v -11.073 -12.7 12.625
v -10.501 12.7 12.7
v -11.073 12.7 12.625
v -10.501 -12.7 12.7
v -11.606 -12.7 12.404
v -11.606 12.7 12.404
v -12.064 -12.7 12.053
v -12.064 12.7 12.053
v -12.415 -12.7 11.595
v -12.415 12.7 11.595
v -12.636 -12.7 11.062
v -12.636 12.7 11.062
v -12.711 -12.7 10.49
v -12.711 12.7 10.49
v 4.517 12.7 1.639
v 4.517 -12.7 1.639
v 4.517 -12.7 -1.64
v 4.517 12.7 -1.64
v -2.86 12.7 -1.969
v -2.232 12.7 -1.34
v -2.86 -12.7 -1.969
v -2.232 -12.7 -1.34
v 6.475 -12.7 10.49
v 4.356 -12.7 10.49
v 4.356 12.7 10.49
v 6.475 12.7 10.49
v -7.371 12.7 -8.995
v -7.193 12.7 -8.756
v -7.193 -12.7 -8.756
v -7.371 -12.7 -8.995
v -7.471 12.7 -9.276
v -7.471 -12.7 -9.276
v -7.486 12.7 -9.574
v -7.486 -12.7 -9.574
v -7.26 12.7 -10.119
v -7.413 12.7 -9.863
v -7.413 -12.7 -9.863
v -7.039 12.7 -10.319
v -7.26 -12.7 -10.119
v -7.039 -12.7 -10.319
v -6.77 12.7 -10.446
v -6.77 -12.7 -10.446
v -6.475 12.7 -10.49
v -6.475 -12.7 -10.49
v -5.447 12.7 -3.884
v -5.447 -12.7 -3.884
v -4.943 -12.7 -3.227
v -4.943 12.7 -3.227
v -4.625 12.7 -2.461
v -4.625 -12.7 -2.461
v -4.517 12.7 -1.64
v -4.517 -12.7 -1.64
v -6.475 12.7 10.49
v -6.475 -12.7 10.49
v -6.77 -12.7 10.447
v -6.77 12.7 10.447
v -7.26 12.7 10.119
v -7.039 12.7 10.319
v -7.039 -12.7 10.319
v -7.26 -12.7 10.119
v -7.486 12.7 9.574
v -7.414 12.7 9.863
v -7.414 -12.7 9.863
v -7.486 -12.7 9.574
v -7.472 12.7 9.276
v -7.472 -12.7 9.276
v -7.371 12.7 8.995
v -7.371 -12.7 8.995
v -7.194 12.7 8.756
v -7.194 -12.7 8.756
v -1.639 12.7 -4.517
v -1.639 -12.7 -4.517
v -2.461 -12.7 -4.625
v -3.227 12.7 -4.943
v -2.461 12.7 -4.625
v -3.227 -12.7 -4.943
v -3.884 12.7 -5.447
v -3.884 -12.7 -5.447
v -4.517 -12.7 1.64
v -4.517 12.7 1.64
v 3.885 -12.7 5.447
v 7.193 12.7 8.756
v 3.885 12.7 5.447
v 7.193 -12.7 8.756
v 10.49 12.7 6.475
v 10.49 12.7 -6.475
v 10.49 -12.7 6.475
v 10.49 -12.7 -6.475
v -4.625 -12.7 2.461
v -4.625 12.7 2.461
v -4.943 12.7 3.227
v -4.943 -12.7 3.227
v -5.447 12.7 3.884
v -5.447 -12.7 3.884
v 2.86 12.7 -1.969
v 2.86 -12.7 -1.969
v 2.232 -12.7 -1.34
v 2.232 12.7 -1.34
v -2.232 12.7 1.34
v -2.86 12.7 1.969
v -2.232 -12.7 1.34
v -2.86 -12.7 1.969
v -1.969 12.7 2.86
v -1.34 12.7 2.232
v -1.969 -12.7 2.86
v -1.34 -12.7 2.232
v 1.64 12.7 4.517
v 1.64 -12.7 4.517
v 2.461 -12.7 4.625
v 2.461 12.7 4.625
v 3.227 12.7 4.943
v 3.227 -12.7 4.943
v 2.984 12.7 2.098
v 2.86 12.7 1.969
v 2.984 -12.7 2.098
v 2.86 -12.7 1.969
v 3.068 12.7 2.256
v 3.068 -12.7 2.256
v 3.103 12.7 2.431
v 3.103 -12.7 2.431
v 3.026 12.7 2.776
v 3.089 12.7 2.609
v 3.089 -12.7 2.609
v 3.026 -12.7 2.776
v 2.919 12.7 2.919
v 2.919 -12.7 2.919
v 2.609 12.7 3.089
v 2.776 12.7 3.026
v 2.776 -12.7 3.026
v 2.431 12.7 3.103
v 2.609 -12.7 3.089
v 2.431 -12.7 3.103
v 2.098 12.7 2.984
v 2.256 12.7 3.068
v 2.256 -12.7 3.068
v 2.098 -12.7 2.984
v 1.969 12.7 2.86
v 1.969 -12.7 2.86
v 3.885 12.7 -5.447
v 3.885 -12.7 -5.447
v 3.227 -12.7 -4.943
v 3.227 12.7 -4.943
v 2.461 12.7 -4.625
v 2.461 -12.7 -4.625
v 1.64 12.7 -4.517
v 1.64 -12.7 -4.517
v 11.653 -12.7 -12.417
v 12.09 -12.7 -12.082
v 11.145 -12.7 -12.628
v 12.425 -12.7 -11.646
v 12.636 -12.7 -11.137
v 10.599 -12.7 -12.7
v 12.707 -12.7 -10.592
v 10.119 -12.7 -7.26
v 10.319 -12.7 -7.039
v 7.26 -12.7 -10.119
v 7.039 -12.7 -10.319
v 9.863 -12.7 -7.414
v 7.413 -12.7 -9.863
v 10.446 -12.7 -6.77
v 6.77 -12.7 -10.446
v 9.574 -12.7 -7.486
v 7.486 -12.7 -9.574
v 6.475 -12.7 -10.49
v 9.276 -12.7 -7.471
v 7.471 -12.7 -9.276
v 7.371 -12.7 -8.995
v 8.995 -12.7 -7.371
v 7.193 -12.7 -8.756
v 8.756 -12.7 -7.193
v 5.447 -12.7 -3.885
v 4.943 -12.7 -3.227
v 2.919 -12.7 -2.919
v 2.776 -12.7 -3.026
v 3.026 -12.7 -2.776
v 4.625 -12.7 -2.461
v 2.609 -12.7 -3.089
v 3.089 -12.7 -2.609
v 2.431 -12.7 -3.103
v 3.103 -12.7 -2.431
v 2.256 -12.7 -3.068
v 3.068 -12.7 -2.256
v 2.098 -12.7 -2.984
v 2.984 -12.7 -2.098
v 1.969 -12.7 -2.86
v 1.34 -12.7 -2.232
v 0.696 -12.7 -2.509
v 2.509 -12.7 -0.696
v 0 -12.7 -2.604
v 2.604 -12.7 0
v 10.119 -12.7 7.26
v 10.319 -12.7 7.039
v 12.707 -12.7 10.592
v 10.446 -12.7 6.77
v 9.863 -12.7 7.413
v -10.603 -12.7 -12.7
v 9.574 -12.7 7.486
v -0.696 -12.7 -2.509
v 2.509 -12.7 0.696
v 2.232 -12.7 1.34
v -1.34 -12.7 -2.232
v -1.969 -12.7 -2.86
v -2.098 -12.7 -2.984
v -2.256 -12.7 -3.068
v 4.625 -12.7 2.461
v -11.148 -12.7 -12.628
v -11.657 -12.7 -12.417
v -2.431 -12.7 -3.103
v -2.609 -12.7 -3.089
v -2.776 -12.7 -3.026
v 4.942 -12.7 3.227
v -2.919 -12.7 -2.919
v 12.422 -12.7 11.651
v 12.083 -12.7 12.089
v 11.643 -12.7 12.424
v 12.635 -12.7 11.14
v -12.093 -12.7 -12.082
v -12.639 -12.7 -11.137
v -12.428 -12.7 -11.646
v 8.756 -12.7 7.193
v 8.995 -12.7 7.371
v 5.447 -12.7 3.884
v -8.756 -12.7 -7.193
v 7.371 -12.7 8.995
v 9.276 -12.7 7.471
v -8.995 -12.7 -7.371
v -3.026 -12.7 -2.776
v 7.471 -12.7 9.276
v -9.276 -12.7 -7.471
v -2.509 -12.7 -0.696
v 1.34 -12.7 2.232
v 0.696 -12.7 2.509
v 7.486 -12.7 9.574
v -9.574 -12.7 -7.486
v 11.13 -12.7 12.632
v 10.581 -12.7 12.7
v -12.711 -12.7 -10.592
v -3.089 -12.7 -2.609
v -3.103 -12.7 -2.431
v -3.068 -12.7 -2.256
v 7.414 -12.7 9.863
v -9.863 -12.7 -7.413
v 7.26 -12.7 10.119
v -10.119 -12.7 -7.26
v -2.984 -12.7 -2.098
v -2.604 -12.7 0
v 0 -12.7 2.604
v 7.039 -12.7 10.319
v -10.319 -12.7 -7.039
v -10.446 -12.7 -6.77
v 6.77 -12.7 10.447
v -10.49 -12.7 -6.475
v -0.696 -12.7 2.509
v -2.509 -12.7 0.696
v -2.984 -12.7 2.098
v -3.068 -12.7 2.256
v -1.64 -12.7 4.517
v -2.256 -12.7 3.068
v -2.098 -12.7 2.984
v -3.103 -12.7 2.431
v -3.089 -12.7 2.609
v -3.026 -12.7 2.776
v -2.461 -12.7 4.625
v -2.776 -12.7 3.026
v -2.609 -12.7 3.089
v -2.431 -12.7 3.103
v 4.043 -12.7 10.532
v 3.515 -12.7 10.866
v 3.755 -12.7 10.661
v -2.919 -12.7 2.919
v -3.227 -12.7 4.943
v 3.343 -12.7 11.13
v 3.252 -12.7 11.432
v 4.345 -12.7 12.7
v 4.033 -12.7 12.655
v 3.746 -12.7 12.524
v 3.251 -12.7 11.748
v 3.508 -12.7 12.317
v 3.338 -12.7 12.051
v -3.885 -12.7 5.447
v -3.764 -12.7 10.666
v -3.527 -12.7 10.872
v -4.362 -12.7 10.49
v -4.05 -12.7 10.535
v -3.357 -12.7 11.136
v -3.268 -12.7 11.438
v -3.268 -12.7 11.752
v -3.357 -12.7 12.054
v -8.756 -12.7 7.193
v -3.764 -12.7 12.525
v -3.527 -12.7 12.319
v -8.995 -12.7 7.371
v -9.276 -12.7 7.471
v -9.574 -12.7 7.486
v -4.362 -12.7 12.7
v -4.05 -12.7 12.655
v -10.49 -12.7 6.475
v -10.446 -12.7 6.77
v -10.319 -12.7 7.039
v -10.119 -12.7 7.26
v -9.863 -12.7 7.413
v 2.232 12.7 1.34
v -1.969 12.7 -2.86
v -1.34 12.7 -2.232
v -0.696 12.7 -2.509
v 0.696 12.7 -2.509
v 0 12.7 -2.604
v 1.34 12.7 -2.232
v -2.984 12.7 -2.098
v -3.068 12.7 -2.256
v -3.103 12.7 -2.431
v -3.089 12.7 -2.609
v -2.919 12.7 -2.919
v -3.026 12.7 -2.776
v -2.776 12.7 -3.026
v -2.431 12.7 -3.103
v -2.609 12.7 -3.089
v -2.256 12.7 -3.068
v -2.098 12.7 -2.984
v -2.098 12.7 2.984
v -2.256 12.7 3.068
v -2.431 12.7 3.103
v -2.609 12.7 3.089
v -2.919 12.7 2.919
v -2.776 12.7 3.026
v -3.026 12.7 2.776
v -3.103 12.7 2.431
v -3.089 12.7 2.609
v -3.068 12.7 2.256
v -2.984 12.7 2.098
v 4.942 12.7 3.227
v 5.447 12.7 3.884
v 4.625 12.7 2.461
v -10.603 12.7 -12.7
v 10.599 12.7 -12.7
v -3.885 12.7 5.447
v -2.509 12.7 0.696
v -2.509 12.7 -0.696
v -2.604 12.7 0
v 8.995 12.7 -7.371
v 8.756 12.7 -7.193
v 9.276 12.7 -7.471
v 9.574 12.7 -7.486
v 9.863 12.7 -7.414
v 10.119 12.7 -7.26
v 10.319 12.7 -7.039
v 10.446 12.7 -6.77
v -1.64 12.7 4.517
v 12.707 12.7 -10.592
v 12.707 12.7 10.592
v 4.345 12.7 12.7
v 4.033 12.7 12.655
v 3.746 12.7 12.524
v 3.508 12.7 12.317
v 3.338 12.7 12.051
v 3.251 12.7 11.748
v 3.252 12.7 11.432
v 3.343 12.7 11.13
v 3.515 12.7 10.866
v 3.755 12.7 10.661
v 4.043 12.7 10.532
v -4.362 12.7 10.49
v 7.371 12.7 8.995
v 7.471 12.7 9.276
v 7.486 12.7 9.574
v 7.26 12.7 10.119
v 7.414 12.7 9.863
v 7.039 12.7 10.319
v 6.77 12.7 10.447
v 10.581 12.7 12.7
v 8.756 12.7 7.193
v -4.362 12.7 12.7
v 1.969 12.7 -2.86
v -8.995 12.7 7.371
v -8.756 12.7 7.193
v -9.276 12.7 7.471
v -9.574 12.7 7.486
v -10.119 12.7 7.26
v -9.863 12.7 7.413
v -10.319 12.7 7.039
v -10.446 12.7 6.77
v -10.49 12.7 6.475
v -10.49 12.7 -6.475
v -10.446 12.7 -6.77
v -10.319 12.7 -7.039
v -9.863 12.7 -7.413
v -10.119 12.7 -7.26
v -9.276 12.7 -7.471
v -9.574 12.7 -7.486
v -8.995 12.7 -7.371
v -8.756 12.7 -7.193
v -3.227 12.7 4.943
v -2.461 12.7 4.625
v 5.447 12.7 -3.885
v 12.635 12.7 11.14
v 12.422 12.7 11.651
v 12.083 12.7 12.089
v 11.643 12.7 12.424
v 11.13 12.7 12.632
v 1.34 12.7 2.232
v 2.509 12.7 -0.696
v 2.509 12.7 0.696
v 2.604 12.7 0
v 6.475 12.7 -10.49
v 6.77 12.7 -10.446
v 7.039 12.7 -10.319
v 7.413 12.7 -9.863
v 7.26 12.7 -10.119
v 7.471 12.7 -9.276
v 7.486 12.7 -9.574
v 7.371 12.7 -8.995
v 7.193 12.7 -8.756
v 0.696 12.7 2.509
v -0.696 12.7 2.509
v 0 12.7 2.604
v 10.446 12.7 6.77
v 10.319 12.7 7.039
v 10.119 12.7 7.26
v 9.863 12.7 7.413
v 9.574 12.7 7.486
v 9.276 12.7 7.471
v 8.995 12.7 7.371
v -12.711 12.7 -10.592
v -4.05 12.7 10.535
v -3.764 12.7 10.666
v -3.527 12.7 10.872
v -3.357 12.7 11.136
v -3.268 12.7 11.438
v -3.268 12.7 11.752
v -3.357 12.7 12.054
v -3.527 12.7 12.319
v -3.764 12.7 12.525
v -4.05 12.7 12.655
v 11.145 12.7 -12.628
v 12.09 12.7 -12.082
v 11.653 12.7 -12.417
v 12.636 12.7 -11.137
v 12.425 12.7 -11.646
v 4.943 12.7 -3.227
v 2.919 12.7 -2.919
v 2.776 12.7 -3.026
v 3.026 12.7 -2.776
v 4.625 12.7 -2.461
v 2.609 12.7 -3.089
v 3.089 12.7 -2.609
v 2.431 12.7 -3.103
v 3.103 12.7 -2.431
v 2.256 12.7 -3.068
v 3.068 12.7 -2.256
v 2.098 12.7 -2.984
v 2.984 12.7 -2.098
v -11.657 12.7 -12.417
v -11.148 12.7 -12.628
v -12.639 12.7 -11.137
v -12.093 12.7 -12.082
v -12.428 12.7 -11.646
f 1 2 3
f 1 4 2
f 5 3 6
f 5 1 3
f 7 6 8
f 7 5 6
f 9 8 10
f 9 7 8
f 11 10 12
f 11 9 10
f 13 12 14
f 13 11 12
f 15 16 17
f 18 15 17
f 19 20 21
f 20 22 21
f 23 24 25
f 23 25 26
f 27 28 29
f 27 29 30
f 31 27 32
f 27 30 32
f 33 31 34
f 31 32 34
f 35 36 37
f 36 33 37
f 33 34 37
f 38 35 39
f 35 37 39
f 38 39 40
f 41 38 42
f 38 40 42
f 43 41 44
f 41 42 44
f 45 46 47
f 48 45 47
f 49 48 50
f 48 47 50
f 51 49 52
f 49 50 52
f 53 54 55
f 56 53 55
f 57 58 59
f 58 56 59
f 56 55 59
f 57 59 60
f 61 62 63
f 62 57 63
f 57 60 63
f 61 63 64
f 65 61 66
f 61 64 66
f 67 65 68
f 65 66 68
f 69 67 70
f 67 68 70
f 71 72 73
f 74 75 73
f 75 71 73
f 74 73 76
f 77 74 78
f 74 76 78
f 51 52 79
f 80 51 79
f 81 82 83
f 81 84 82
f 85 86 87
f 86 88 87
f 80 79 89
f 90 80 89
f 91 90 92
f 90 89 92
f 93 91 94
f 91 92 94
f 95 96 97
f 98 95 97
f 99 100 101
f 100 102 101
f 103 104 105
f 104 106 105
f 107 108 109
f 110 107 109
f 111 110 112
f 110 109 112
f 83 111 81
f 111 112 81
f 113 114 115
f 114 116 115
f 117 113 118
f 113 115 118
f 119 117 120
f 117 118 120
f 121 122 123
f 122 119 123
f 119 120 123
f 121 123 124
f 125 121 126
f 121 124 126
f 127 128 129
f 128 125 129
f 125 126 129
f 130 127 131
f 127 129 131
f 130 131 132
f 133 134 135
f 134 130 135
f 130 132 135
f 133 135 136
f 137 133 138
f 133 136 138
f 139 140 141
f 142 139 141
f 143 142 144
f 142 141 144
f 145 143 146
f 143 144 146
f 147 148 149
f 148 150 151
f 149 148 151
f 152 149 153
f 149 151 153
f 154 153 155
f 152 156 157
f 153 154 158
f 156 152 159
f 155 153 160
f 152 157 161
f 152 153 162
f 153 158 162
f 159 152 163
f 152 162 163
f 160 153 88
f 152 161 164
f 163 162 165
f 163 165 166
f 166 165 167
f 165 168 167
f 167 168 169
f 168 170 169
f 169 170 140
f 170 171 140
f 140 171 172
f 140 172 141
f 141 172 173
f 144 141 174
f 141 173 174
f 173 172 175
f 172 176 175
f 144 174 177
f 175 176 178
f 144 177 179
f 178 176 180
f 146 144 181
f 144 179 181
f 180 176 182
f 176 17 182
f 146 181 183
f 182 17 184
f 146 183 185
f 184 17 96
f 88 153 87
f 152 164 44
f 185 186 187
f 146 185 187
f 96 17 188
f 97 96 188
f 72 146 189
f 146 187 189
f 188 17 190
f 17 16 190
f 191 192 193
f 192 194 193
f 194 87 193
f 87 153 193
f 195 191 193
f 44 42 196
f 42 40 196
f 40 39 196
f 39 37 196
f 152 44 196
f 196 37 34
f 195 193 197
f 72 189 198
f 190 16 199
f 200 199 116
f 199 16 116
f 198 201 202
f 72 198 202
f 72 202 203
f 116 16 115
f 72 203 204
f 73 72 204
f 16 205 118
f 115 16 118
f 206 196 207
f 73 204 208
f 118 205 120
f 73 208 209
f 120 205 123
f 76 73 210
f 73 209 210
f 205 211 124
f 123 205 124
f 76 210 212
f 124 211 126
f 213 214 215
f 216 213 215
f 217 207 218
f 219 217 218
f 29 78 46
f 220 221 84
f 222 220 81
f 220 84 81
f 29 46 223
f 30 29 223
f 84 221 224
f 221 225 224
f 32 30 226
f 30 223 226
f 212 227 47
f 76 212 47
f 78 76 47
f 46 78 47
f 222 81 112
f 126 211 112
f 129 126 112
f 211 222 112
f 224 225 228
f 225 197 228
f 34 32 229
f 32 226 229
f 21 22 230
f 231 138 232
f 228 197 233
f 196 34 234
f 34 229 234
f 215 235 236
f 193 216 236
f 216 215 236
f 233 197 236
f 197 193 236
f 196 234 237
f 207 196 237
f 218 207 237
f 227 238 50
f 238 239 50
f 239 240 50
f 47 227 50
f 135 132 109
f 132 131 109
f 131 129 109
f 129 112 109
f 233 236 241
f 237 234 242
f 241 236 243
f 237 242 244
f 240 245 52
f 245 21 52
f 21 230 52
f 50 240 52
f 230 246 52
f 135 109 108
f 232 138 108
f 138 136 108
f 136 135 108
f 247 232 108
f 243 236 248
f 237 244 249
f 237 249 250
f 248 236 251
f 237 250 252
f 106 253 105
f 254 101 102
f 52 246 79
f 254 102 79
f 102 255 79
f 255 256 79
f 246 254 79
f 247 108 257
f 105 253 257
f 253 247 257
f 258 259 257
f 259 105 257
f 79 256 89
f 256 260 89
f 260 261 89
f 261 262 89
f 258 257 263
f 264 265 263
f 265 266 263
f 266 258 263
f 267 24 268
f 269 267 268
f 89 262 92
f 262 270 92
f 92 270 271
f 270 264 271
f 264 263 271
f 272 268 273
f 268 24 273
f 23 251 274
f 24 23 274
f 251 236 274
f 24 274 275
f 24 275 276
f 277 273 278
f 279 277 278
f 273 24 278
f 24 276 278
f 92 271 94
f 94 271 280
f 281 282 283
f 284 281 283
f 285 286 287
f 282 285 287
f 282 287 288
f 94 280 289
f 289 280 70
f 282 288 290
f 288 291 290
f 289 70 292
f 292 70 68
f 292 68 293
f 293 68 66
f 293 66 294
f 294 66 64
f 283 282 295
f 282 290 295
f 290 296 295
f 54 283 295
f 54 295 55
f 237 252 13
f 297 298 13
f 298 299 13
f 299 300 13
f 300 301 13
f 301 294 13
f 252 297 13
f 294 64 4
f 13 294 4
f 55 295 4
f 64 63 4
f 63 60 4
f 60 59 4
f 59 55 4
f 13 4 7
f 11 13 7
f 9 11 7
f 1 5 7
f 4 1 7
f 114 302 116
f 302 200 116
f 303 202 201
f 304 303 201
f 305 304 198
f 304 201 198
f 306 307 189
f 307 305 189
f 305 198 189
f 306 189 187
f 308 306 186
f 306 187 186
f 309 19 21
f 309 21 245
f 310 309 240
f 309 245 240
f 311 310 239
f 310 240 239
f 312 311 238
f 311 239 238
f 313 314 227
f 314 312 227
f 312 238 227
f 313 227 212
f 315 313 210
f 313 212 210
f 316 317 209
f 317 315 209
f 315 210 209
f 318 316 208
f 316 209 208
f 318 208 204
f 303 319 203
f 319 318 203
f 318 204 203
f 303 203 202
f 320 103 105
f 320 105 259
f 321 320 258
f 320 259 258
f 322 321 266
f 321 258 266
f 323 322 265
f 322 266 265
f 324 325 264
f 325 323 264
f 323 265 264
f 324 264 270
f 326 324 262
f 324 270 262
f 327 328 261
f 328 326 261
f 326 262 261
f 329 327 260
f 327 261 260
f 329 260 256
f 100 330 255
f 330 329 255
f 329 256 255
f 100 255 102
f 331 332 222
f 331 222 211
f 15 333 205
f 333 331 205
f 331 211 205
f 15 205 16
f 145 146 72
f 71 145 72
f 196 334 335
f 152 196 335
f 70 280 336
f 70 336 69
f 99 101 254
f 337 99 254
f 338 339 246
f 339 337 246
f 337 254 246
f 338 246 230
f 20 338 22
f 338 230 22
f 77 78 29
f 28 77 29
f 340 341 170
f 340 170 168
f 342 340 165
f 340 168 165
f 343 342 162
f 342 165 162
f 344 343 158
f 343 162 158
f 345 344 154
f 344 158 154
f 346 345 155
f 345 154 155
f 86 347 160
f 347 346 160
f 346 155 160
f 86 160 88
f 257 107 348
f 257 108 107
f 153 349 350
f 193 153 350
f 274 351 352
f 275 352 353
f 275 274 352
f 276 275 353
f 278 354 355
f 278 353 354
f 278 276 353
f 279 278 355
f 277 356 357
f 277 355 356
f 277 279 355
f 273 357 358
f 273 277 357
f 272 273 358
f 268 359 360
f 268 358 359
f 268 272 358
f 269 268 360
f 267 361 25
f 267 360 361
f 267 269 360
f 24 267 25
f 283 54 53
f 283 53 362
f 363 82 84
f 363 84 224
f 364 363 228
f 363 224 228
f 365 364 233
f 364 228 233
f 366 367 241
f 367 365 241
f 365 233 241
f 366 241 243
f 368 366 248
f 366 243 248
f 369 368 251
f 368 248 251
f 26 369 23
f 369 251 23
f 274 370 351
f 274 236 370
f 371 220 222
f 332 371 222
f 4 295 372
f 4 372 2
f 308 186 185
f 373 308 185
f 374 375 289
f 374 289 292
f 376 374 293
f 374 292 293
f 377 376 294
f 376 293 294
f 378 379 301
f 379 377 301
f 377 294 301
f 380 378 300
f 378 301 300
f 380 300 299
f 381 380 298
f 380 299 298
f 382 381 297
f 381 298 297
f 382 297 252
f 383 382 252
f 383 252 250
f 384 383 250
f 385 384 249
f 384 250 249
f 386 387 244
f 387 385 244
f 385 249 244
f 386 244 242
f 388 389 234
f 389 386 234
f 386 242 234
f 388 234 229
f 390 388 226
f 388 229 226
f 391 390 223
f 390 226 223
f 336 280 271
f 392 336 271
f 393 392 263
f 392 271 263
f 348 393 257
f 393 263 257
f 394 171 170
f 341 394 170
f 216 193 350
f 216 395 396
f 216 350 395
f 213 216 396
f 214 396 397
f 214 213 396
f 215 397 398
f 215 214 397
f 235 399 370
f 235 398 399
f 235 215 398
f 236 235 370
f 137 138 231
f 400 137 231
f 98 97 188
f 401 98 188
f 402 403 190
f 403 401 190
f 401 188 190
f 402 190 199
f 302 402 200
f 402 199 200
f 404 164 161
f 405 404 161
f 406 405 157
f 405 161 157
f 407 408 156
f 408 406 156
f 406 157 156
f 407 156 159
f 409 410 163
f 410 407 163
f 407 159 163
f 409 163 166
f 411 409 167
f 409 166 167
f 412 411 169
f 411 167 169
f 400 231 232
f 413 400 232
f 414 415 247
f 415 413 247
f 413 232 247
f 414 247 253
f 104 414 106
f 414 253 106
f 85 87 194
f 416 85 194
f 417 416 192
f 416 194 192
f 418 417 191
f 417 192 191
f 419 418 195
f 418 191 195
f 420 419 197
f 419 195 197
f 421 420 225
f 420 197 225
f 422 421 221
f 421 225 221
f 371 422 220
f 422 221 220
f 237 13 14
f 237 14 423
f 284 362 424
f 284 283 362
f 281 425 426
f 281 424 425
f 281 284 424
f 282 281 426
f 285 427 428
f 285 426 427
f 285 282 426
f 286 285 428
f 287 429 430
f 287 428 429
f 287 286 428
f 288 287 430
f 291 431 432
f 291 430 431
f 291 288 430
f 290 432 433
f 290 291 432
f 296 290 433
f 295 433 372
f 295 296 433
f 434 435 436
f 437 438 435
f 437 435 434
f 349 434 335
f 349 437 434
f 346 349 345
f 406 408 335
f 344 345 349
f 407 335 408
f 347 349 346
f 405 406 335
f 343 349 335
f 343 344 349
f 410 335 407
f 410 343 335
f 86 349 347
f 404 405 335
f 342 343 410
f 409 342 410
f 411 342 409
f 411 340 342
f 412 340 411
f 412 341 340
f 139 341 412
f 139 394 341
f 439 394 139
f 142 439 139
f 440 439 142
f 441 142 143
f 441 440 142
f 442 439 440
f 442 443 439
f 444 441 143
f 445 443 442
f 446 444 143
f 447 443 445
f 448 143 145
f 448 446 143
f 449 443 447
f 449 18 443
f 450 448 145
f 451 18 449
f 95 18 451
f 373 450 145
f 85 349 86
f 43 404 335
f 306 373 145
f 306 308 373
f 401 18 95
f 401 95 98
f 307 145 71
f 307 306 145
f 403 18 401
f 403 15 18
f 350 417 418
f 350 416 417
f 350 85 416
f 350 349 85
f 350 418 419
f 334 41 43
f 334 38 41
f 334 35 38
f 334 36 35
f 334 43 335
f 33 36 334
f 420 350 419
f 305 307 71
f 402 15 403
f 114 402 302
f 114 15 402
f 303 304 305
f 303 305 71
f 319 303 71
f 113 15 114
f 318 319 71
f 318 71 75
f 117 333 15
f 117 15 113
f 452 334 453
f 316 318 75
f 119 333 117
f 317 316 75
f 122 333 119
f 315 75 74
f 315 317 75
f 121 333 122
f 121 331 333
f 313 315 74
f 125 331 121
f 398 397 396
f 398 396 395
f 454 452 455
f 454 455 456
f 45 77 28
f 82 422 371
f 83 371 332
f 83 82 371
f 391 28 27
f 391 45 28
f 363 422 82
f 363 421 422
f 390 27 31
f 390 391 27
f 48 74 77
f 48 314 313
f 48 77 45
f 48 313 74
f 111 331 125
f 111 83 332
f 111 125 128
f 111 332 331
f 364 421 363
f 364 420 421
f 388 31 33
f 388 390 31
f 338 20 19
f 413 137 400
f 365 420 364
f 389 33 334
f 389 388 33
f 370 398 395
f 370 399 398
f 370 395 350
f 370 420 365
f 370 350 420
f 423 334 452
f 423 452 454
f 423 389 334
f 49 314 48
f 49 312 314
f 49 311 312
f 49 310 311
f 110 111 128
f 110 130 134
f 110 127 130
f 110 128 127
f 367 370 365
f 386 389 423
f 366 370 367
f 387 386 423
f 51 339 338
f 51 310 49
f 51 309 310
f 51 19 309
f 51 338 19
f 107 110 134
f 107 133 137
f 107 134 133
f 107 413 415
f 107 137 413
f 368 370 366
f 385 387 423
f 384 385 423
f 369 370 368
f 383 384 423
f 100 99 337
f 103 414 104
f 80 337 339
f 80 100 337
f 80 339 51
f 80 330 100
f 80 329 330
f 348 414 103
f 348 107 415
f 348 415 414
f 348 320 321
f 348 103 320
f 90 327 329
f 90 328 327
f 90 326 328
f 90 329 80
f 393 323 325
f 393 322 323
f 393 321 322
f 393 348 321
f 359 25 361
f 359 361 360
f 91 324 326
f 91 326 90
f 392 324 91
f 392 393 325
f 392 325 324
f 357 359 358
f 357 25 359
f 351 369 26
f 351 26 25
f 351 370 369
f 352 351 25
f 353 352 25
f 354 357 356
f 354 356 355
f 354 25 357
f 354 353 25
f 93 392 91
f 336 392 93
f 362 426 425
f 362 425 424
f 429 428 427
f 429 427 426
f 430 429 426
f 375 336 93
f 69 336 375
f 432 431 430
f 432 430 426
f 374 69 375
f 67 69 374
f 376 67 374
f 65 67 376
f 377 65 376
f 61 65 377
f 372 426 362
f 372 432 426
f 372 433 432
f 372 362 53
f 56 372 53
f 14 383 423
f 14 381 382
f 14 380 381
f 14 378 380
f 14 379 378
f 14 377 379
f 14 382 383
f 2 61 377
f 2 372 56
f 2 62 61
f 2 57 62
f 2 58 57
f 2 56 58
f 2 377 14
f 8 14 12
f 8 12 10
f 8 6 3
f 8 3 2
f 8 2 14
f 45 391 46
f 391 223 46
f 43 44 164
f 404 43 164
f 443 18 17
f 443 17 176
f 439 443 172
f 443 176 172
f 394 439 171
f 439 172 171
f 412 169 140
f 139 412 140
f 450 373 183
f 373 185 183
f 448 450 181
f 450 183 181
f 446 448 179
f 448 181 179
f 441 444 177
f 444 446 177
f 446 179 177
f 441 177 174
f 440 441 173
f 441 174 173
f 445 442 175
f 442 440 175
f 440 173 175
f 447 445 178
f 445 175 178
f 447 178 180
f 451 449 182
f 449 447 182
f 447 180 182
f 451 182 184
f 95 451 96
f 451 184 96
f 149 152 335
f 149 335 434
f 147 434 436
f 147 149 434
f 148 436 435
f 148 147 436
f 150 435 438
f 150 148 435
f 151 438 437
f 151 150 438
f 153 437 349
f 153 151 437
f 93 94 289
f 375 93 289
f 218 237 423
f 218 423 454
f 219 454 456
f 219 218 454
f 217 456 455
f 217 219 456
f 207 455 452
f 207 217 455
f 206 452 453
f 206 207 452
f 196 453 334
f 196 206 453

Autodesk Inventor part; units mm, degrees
ref_plane "YZ Plane" through (0, 0, 0) normal (1, 0, 0) x (0, 1, 0)
ref_plane "XZ Plane" through (0, 0, 0) normal (0, 1, 0) x (-1, 0, 0)
ref_plane "XY Plane" through (0, 0, 0) normal (0, 0, 1) x (1, 0, 0)
sketch "Sketch1" plane through (0, 0, 0) normal (0, 1, 0) x (-1, 0, 0)
  arc A0 (4.5172, -1.6395) -> (5.4471, -3.8845) centre (7.6922, -1.6395) ccw
  line L0 (8.7558, -7.1932) -> (5.4471, -3.8845)
  arc A1 (8.7558, -7.1932) -> (10.4902, -6.4748) centre (9.4742, -6.4748) ccw
  line L1 (10.4902, 6.4748) -> (10.4902, -6.4748)
  arc A2 (10.4902, 6.4748) -> (8.7558, 7.1932) centre (9.4742, 6.4748) ccw
  line L2 (5.4471, 3.8845) -> (8.7558, 7.1932)
  arc A3 (5.4471, 3.8845) -> (4.5172, 1.6395) centre (7.6922, 1.6395) ccw
  line L3 (4.5172, -1.6395) -> (4.5172, 1.6395)
  arc A4 (6.4748, -10.4902) -> (7.1932, -8.7558) centre (6.4748, -9.4742) ccw
  line L4 (3.8845, -5.4471) -> (7.1932, -8.7558)
  arc A5 (3.8845, -5.4471) -> (1.6394, -4.5172) centre (1.6394, -7.6922) ccw
  line L5 (-1.6395, -4.5172) -> (1.6394, -4.5172)
  arc A6 (-1.6395, -4.5172) -> (-3.8846, -5.4471) centre (-1.6395, -7.6922) ccw
  line L6 (-7.1932, -8.7558) -> (-3.8846, -5.4471)
  arc A7 (-7.1932, -8.7558) -> (-6.4748, -10.4902) centre (-6.4748, -9.4742) ccw
  line L7 (6.4748, -10.4902) -> (-6.4748, -10.4902)
  arc A8 (-10.4902, -6.4749) -> (-8.7557, -7.1933) centre (-9.4742, -6.4749) ccw
  line L8 (-5.4471, -3.8846) -> (-8.7557, -7.1933)
  arc A9 (-5.4471, -3.8846) -> (-4.5171, -1.6396) centre (-7.6921, -1.6396) ccw
  line L9 (-4.5171, 1.6394) -> (-4.5171, -1.6396)
  arc A10 (-4.5171, 1.6394) -> (-5.4471, 3.8844) centre (-7.6921, 1.6394) ccw
  line L10 (-8.7557, 7.1931) -> (-5.4471, 3.8844)
  arc A11 (-8.7557, 7.1931) -> (-10.4902, 6.4747) centre (-9.4742, 6.4747) ccw
  line L11 (-10.4902, -6.4749) -> (-10.4902, 6.4747)
  arc A12 (1.3405, 2.2319) -> (-1.3405, 2.2319) centre (0, 0) ccw
  line L12 (-1.9692, 2.8605) -> (-1.3405, 2.2319)
  arc A13 (-1.9692, 2.8605) -> (-2.8605, 1.9692) centre (-2.4696, 2.4696) ccw
  line L13 (-2.2319, 1.3405) -> (-2.8605, 1.9692)
  arc A14 (-2.2319, 1.3405) -> (-2.2319, -1.3405) centre (0, 0) ccw
  line L14 (-2.8605, -1.9692) -> (-2.2319, -1.3405)
  arc A15 (-2.8605, -1.9692) -> (-1.9692, -2.8605) centre (-2.4696, -2.4696) ccw
  line L15 (-1.3405, -2.2319) -> (-1.9692, -2.8605)
  arc A16 (-1.3405, -2.2319) -> (1.3405, -2.2319) centre (0, 0) ccw
  line L16 (1.9692, -2.8605) -> (1.3405, -2.2319)
  arc A17 (1.9692, -2.8605) -> (2.8605, -1.9692) centre (2.4696, -2.4696) ccw
  line L17 (2.2319, -1.3405) -> (2.8605, -1.9692)
  arc A18 (2.2319, -1.3405) -> (2.2319, 1.3405) centre (0, 0) ccw
  line L18 (2.8605, 1.9692) -> (2.2319, 1.3405)
  arc A19 (2.8605, 1.9692) -> (1.9692, 2.8605) centre (2.4696, 2.4696) ccw
  line L19 (1.3405, 2.2319) -> (1.9692, 2.8605)
  arc A20 (-4.3561, 10.4904) -> (-4.3452, 12.7001) centre (-4.3451, 11.5952) ccw
  line L20 (-4.3561, 10.4904) -> (-6.4749, 10.4903)
  arc A21 (-6.4749, 10.4903) -> (-7.1933, 8.7559) centre (-6.4749, 9.4743) ccw
  line L21 (-7.1933, 8.7559) -> (-3.8846, 5.4472)
  arc A22 (-3.8846, 5.4472) -> (-1.6396, 4.5173) centre (-1.6396, 7.6923) ccw
  line L22 (-1.6396, 4.5173) -> (1.6397, 4.5173)
  arc A23 (1.6397, 4.5173) -> (3.8848, 5.4472) centre (1.6397, 7.6923) ccw
  line L23 (3.8848, 5.4472) -> (7.1935, 8.7559)
  arc A24 (7.1935, 8.7559) -> (6.475, 10.4903) centre (6.475, 9.4743) ccw
  line L24 (6.475, 10.4903) -> (4.3616, 10.4903)
  arc A25 (4.3616, 12.7001) -> (4.3616, 10.4903) centre (4.3616, 11.5952) ccw
  line L25 (4.3616, 12.7001) -> (10.5011, 12.7001)
  arc A26 (12.7109, 10.4903) -> (10.5011, 12.7001) centre (10.5011, 10.4903) ccw
  line L26 (12.7109, 10.4903) -> (12.7109, -10.5917)
  arc A27 (10.6027, -12.6999) -> (12.7109, -10.5917) centre (10.6027, -10.5917) ccw
  line L27 (10.6027, -12.6999) -> (-10.5992, -12.6999)
  arc A28 (-12.7074, -10.5917) -> (-10.5992, -12.6999) centre (-10.5992, -10.5917) ccw
  line L28 (-12.7074, -10.5917) -> (-12.7074, 10.5919)
  arc A29 (-10.5809, 12.7) -> (-12.7074, 10.5919) centre (-10.5992, 10.5919) ccw
  line L29 (-10.5809, 12.7) -> (-4.3452, 12.7001)
  point P0 (0, 0)
  dimension "d100" = 8.1828
  dimension "d103" = 25.4
extrude "Extrusion1" add sketch "Sketch1" along normal mid plane 25.4
properties part number "1001-S-BLACK-FB" material "6105-T5"
